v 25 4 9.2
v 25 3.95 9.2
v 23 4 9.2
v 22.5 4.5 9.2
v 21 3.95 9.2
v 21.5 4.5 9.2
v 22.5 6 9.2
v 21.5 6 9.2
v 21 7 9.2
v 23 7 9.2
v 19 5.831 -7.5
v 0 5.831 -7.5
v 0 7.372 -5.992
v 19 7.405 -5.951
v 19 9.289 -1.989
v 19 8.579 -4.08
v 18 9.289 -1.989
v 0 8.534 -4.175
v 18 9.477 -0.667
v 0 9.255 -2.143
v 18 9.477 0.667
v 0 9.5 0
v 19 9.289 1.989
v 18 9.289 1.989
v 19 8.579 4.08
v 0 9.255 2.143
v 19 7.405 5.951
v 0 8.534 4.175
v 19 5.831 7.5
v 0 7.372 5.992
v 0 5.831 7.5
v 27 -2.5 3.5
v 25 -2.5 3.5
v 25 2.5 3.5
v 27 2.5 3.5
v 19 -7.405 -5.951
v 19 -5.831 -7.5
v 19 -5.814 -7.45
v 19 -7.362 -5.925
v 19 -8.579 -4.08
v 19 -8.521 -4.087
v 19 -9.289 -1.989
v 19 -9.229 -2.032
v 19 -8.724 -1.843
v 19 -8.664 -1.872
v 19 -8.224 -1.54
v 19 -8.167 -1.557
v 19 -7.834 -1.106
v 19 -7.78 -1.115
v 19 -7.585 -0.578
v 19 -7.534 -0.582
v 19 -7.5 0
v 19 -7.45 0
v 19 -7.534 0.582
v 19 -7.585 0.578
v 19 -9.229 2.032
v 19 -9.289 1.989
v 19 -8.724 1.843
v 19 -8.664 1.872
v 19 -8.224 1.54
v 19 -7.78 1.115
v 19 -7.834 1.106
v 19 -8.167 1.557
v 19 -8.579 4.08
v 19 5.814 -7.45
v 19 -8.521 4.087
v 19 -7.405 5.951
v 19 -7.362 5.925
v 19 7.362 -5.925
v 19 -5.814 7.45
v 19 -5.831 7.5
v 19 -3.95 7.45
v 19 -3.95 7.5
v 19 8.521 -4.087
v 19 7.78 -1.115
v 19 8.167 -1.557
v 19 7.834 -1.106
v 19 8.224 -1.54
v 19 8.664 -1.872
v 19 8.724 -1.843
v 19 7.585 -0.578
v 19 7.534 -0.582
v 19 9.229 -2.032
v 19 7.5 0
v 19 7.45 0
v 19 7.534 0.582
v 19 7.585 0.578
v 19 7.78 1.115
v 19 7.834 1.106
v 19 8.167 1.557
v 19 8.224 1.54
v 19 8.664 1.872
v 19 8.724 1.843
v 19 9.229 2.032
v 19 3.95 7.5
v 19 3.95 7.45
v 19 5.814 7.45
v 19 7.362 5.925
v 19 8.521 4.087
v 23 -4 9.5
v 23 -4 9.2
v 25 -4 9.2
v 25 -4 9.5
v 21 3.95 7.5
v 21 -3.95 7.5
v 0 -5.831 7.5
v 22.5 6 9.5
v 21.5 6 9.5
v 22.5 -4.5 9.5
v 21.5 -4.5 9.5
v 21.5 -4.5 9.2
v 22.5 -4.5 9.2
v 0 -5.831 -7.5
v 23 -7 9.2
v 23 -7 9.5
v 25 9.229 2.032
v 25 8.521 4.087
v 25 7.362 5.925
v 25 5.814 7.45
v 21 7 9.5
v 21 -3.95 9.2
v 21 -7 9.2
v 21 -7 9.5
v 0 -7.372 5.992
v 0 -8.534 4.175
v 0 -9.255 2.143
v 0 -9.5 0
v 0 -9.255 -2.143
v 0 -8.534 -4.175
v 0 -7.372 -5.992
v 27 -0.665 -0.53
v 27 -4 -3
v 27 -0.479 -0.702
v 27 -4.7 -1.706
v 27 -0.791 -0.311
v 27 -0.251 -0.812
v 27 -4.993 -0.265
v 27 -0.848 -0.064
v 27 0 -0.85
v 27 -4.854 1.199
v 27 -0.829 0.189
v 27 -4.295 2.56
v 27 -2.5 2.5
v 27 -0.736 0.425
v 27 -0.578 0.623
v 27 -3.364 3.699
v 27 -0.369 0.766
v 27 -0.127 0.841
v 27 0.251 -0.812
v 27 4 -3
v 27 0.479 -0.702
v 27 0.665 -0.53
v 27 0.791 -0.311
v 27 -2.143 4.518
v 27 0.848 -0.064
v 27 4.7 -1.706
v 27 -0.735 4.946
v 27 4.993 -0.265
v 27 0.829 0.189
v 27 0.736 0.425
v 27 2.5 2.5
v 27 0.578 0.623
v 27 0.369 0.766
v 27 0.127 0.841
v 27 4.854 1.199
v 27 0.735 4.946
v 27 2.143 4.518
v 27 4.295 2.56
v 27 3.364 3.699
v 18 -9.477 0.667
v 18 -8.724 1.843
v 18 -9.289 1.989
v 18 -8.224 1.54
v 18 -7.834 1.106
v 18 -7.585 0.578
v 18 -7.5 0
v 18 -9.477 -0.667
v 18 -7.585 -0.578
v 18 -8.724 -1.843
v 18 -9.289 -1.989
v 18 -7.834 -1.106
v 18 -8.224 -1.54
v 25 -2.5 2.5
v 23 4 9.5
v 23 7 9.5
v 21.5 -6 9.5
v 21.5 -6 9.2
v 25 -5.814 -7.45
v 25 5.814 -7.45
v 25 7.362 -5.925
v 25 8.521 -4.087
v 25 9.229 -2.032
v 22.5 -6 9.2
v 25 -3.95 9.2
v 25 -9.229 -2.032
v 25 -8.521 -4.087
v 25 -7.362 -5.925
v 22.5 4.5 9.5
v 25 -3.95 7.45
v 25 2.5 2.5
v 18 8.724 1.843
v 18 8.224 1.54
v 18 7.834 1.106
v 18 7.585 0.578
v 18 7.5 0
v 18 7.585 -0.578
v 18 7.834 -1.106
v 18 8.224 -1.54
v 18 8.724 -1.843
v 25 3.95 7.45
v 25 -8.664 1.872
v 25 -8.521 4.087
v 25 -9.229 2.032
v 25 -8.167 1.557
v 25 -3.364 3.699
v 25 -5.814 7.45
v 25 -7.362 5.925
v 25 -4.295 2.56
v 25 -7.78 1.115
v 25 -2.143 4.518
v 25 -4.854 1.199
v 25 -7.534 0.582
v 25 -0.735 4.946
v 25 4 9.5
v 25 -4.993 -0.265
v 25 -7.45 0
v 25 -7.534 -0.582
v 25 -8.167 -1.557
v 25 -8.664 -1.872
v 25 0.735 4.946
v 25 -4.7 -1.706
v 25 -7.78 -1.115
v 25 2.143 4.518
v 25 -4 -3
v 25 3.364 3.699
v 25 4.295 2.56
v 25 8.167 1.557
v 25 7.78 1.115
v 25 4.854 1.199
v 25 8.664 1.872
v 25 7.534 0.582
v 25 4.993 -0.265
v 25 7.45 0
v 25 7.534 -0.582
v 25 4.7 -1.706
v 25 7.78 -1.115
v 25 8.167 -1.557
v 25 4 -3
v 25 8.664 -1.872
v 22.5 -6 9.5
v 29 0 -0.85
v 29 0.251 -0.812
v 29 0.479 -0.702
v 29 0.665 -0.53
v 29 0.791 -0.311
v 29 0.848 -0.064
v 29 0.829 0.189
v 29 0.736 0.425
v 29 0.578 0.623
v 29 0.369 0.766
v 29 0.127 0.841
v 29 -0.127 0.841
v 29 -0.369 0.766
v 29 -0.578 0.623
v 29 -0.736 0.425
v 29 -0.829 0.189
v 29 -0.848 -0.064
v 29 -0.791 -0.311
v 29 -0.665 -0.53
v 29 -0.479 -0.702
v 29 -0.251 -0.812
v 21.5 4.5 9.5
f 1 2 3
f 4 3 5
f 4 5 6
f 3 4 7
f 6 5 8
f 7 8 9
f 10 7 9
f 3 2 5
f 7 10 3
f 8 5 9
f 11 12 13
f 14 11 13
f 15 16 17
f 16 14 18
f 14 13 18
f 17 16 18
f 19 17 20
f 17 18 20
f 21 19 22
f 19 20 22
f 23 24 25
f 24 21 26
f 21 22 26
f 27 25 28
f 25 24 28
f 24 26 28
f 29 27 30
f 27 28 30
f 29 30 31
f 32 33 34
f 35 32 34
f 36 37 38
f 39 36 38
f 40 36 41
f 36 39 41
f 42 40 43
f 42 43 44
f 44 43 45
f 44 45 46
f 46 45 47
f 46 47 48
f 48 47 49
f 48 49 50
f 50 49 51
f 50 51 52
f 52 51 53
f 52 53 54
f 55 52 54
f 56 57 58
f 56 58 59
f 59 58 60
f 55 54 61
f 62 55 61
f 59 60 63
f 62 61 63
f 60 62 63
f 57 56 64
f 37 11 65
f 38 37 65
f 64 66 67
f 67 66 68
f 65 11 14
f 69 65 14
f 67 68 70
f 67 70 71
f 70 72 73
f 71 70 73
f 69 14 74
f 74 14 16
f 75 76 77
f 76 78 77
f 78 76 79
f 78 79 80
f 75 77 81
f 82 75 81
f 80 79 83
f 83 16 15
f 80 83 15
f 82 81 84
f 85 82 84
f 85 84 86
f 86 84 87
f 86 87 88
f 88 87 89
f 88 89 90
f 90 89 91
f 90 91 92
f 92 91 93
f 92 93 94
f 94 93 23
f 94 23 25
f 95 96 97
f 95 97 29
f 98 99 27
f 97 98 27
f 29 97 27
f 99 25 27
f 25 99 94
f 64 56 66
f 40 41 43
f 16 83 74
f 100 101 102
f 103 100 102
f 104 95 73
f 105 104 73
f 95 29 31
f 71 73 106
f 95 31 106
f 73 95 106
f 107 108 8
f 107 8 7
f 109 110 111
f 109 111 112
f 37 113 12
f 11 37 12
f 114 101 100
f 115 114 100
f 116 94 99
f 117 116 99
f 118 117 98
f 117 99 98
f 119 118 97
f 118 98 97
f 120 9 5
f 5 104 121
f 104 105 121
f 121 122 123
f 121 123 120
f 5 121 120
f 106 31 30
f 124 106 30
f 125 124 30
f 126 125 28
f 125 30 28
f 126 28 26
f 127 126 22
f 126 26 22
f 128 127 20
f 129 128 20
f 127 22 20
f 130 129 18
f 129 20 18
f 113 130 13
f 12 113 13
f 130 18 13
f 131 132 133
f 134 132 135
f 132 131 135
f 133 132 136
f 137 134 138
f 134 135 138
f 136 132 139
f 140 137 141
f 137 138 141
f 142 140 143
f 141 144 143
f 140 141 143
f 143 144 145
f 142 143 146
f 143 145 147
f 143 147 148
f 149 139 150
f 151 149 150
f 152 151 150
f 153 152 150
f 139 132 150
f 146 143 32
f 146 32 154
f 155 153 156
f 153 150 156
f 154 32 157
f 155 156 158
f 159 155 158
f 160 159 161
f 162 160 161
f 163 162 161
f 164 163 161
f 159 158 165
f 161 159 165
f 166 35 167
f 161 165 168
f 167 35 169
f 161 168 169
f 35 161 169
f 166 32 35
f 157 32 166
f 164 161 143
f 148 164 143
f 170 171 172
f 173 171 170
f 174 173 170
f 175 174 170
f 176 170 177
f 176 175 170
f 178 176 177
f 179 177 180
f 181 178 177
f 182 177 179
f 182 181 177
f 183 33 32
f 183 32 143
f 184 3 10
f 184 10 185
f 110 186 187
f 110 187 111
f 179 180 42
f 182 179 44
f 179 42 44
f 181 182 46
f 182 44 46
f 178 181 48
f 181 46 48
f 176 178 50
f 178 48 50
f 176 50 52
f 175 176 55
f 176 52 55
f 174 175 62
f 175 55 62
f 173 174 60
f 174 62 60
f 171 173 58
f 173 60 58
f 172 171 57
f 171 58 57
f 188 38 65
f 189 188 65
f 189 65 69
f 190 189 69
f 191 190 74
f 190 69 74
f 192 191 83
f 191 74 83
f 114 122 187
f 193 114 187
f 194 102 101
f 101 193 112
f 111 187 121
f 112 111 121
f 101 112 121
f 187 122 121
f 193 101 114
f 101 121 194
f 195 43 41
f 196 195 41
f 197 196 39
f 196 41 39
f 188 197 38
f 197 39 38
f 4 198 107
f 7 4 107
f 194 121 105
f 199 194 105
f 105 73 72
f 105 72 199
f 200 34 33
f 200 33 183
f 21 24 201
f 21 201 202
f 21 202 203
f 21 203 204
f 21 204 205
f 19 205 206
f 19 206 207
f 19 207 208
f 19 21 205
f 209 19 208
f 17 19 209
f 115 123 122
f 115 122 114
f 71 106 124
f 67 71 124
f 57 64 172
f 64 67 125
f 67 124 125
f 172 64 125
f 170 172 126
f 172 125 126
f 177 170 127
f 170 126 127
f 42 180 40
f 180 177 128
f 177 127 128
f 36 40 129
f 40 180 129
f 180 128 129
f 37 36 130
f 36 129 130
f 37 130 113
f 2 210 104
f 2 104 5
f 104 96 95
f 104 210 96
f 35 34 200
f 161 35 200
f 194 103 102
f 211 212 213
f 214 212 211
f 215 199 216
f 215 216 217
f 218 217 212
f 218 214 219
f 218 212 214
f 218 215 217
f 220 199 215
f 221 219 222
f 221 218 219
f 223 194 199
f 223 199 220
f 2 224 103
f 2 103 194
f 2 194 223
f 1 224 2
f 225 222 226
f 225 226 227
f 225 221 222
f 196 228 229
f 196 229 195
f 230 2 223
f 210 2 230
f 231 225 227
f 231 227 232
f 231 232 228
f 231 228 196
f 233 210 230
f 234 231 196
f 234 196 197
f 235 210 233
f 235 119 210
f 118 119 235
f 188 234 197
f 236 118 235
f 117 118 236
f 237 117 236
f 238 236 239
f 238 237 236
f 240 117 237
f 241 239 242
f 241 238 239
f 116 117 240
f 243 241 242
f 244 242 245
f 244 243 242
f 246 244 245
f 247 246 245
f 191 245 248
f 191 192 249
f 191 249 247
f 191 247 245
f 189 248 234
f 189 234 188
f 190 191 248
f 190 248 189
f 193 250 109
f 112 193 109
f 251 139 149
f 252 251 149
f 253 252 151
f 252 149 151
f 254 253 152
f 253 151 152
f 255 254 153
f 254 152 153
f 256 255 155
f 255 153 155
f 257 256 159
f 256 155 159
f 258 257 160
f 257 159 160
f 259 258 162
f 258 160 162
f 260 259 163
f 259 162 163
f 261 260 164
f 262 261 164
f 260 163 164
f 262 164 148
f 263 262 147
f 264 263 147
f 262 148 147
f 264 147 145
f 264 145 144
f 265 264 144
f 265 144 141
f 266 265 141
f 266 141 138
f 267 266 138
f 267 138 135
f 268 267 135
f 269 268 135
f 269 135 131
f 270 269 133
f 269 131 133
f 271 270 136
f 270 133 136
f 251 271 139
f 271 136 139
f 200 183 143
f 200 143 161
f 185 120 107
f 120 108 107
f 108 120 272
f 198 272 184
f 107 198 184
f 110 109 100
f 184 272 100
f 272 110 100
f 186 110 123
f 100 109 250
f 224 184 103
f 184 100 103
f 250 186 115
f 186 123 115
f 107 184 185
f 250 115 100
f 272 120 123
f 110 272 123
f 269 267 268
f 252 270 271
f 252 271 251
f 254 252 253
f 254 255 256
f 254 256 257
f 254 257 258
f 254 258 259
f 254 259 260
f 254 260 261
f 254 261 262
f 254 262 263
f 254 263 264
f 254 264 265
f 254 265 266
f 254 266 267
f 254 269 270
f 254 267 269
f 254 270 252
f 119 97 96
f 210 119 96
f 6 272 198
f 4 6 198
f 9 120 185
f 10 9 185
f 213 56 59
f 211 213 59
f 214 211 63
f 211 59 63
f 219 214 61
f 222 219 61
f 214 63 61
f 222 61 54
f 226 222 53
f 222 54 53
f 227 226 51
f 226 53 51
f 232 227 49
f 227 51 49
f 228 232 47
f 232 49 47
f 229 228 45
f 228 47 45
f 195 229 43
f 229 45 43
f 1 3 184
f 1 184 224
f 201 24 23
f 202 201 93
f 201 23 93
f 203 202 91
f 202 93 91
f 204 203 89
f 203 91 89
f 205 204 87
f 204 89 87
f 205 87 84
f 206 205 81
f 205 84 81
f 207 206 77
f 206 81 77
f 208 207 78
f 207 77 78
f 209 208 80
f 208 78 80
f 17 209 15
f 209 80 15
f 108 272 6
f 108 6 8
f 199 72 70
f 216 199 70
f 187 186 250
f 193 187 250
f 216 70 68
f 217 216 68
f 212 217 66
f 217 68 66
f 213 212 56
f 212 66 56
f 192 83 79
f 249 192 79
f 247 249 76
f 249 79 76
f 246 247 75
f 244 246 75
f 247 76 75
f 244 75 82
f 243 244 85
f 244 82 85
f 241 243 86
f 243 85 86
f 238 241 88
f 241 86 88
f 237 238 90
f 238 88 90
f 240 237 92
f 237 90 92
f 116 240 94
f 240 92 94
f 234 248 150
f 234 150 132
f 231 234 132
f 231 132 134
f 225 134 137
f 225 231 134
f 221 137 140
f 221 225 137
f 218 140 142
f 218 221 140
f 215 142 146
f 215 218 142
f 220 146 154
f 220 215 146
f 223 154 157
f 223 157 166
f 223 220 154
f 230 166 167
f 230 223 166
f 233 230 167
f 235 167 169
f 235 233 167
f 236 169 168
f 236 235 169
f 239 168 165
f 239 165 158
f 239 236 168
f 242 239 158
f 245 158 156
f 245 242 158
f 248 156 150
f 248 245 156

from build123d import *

# Parameters (mm, degrees)
BOSS_EXTRUDE1_DEPTH = 25
SKETCH2_R           = 2
CUT_EXTRUDE1_DEPTH  = 7
SKETCH3_W           = 1
SKETCH3_H           = 5
BOSS_EXTRUDE2_DEPTH = 2
SKETCH4_R           = 0.85
BOSS_EXTRUDE3_DEPTH = 2
SKETCH5_W           = 4
SKETCH5_H           = 8
BOSS_EXTRUDE4_DEPTH = 2
SKETCH6_W           = 2
SKETCH6_H           = 0.3
BOSS_EXTRUDE5_DEPTH = 3
SKETCH7_W           = 1
SKETCH7_H           = 1.5
CUT_EXTRUDE2_DEPTH  = 1
CUT_EXTRUDE3_START  = -6
CUT_EXTRUDE3_DEPTH  = 6


with BuildPart() as part:
    # Sketch1 → Boss-Extrude1 (new body)
    with BuildSketch(Plane(origin=(0, 0, 0), x_dir=(0, 0, -1), z_dir=(1, 0, 0))):
        with BuildLine():
            Line((-7.5, 5.830951895), (-7.5, -5.830951895))
            ThreePointArc((-7.5, -5.830951895), (0, -9.5), (7.5, -5.830951895))
            Line((7.5, -5.830951895), (7.5, 5.830951895))
            ThreePointArc((7.5, 5.830951895), (0, 9.5), (-7.5, 5.830951895))
        make_face()
    extrude(amount=BOSS_EXTRUDE1_DEPTH)

    # Sketch2 → Cut-Extrude1 (cut)
    with BuildSketch(Plane(origin=(25, 0, 0), x_dir=(0, 0, -1), z_dir=(1, 0, 0))):
        with Locations((0, 9.5)):
            Circle(SKETCH2_R)
        with Locations((0, -9.5)):
            Circle(SKETCH2_R)
    extrude(amount=-CUT_EXTRUDE1_DEPTH, mode=Mode.SUBTRACT)

    # Sketch3 → Boss-Extrude2 (add)
    with BuildSketch(Plane(origin=(25, 0, 0), x_dir=(0, 0, -1), z_dir=(1, 0, 0))):
        with BuildLine():
            Line((3, 4), (3, -4))
            ThreePointArc((3, -4), (-5, 0), (3, 4))
        make_face()
        with Locations((-3, 0)):
            Rectangle(SKETCH3_W, SKETCH3_H, mode=Mode.SUBTRACT)
    extrude(amount=BOSS_EXTRUDE2_DEPTH)

    # Sketch4 → Boss-Extrude3 (add)
    with BuildSketch(Plane(origin=(27, 0, 0), x_dir=(0, 0, -1), z_dir=(1, 0, 0))):
        Circle(SKETCH4_R)
    extrude(amount=BOSS_EXTRUDE3_DEPTH)

    # Sketch5 → Boss-Extrude4 (add)
    with BuildSketch(Plane.XY.offset(7.5)):
        with Locations((23, 0)):
            Rectangle(SKETCH5_W, SKETCH5_H)
    extrude(amount=BOSS_EXTRUDE4_DEPTH)

    # Sketch6 → Boss-Extrude5 (add)
    with BuildSketch(Plane.XZ.offset(4)):
        with Locations((22, 9.35)):
            Rectangle(SKETCH6_W, SKETCH6_H)
    boss_extrude5 = extrude(amount=BOSS_EXTRUDE5_DEPTH)

    # Mirror1: Boss-Extrude5 across plane
    add(boss_extrude5.mirror(Plane.ZX))

    # Sketch7 → Cut-Extrude2 (cut)
    with BuildSketch(Plane.XY.offset(9.5)):
        with Locations((22, -5.25)):
            Rectangle(SKETCH7_W, SKETCH7_H)
        with Locations((22, 5.25)):
            Rectangle(SKETCH7_W, SKETCH7_H)
    extrude(amount=-CUT_EXTRUDE2_DEPTH, mode=Mode.SUBTRACT)

    # Sketch8 → Cut-Extrude3 (cut)
    with BuildSketch(Plane(origin=(25, 0, 0), x_dir=(0, 0, -1), z_dir=(1, 0, 0)).offset(CUT_EXTRUDE3_START)):
        with BuildLine():
            Line((-7.45, 5.813776741), (-7.45, 3.95))
            Line((-7.45, 3.95), (-9.2, 3.95))
            Line((-9.2, 3.95), (-9.2, 4))
            Line((-9.2, 4), (-7.5, 4))
            Line((-7.5, 4), (-7.5, 5.830951895))
            ThreePointArc((-7.5, 5.830951895), (-5.049761967, 8.04673251), (-1.988888803, 9.289473684))
            ThreePointArc((-1.988888803, 9.289473684), (0, 7.5), (1.988888803, 9.289473684))
            ThreePointArc((1.988888803, 9.289473684), (5.049761967, 8.04673251), (7.5, 5.830951895))
            Line((7.5, 5.830951895), (7.5, -5.830951895))
            ThreePointArc((7.5, -5.830951895), (5.049761967, -8.04673251), (1.988888803, -9.289473684))
            ThreePointArc((1.988888803, -9.289473684), (0, -7.5), (-1.988888803, -9.289473684))
            ThreePointArc((-1.988888803, -9.289473684), (-5.049761967, -8.04673251), (-7.5, -5.830951895))
            Line((-7.5, -5.830951895), (-7.5, -4))
            Line((-7.5, -4), (-9.2, -4))
            Line((-9.2, -4), (-9.2, -3.95))
            Line((-9.2, -3.95), (-7.45, -3.95))
            Line((-7.45, -3.95), (-7.45, -5.813776741))
            ThreePointArc((-7.45, -5.813776741), (-5.039140418, -7.994345742), (-2.032001592, -9.228947368))
            ThreePointArc((-2.032001592, -9.228947368), (0, -7.45), (2.032001592, -9.228947368))
            ThreePointArc((2.032001592, -9.228947368), (5.039140418, -7.994345742), (7.45, -5.813776741))
            Line((7.45, -5.813776741), (7.45, 5.813776741))
            ThreePointArc((7.45, 5.813776741), (5.039140418, 7.994345742), (2.032001592, 9.228947368))
            ThreePointArc((2.032001592, 9.228947368), (0, 7.45), (-2.032001592, 9.228947368))
            ThreePointArc((-2.032001592, 9.228947368), (-5.039140418, 7.994345742), (-7.45, 5.813776741))
        make_face()
    extrude(amount=CUT_EXTRUDE3_DEPTH, mode=Mode.SUBTRACT)


solid = part.part
